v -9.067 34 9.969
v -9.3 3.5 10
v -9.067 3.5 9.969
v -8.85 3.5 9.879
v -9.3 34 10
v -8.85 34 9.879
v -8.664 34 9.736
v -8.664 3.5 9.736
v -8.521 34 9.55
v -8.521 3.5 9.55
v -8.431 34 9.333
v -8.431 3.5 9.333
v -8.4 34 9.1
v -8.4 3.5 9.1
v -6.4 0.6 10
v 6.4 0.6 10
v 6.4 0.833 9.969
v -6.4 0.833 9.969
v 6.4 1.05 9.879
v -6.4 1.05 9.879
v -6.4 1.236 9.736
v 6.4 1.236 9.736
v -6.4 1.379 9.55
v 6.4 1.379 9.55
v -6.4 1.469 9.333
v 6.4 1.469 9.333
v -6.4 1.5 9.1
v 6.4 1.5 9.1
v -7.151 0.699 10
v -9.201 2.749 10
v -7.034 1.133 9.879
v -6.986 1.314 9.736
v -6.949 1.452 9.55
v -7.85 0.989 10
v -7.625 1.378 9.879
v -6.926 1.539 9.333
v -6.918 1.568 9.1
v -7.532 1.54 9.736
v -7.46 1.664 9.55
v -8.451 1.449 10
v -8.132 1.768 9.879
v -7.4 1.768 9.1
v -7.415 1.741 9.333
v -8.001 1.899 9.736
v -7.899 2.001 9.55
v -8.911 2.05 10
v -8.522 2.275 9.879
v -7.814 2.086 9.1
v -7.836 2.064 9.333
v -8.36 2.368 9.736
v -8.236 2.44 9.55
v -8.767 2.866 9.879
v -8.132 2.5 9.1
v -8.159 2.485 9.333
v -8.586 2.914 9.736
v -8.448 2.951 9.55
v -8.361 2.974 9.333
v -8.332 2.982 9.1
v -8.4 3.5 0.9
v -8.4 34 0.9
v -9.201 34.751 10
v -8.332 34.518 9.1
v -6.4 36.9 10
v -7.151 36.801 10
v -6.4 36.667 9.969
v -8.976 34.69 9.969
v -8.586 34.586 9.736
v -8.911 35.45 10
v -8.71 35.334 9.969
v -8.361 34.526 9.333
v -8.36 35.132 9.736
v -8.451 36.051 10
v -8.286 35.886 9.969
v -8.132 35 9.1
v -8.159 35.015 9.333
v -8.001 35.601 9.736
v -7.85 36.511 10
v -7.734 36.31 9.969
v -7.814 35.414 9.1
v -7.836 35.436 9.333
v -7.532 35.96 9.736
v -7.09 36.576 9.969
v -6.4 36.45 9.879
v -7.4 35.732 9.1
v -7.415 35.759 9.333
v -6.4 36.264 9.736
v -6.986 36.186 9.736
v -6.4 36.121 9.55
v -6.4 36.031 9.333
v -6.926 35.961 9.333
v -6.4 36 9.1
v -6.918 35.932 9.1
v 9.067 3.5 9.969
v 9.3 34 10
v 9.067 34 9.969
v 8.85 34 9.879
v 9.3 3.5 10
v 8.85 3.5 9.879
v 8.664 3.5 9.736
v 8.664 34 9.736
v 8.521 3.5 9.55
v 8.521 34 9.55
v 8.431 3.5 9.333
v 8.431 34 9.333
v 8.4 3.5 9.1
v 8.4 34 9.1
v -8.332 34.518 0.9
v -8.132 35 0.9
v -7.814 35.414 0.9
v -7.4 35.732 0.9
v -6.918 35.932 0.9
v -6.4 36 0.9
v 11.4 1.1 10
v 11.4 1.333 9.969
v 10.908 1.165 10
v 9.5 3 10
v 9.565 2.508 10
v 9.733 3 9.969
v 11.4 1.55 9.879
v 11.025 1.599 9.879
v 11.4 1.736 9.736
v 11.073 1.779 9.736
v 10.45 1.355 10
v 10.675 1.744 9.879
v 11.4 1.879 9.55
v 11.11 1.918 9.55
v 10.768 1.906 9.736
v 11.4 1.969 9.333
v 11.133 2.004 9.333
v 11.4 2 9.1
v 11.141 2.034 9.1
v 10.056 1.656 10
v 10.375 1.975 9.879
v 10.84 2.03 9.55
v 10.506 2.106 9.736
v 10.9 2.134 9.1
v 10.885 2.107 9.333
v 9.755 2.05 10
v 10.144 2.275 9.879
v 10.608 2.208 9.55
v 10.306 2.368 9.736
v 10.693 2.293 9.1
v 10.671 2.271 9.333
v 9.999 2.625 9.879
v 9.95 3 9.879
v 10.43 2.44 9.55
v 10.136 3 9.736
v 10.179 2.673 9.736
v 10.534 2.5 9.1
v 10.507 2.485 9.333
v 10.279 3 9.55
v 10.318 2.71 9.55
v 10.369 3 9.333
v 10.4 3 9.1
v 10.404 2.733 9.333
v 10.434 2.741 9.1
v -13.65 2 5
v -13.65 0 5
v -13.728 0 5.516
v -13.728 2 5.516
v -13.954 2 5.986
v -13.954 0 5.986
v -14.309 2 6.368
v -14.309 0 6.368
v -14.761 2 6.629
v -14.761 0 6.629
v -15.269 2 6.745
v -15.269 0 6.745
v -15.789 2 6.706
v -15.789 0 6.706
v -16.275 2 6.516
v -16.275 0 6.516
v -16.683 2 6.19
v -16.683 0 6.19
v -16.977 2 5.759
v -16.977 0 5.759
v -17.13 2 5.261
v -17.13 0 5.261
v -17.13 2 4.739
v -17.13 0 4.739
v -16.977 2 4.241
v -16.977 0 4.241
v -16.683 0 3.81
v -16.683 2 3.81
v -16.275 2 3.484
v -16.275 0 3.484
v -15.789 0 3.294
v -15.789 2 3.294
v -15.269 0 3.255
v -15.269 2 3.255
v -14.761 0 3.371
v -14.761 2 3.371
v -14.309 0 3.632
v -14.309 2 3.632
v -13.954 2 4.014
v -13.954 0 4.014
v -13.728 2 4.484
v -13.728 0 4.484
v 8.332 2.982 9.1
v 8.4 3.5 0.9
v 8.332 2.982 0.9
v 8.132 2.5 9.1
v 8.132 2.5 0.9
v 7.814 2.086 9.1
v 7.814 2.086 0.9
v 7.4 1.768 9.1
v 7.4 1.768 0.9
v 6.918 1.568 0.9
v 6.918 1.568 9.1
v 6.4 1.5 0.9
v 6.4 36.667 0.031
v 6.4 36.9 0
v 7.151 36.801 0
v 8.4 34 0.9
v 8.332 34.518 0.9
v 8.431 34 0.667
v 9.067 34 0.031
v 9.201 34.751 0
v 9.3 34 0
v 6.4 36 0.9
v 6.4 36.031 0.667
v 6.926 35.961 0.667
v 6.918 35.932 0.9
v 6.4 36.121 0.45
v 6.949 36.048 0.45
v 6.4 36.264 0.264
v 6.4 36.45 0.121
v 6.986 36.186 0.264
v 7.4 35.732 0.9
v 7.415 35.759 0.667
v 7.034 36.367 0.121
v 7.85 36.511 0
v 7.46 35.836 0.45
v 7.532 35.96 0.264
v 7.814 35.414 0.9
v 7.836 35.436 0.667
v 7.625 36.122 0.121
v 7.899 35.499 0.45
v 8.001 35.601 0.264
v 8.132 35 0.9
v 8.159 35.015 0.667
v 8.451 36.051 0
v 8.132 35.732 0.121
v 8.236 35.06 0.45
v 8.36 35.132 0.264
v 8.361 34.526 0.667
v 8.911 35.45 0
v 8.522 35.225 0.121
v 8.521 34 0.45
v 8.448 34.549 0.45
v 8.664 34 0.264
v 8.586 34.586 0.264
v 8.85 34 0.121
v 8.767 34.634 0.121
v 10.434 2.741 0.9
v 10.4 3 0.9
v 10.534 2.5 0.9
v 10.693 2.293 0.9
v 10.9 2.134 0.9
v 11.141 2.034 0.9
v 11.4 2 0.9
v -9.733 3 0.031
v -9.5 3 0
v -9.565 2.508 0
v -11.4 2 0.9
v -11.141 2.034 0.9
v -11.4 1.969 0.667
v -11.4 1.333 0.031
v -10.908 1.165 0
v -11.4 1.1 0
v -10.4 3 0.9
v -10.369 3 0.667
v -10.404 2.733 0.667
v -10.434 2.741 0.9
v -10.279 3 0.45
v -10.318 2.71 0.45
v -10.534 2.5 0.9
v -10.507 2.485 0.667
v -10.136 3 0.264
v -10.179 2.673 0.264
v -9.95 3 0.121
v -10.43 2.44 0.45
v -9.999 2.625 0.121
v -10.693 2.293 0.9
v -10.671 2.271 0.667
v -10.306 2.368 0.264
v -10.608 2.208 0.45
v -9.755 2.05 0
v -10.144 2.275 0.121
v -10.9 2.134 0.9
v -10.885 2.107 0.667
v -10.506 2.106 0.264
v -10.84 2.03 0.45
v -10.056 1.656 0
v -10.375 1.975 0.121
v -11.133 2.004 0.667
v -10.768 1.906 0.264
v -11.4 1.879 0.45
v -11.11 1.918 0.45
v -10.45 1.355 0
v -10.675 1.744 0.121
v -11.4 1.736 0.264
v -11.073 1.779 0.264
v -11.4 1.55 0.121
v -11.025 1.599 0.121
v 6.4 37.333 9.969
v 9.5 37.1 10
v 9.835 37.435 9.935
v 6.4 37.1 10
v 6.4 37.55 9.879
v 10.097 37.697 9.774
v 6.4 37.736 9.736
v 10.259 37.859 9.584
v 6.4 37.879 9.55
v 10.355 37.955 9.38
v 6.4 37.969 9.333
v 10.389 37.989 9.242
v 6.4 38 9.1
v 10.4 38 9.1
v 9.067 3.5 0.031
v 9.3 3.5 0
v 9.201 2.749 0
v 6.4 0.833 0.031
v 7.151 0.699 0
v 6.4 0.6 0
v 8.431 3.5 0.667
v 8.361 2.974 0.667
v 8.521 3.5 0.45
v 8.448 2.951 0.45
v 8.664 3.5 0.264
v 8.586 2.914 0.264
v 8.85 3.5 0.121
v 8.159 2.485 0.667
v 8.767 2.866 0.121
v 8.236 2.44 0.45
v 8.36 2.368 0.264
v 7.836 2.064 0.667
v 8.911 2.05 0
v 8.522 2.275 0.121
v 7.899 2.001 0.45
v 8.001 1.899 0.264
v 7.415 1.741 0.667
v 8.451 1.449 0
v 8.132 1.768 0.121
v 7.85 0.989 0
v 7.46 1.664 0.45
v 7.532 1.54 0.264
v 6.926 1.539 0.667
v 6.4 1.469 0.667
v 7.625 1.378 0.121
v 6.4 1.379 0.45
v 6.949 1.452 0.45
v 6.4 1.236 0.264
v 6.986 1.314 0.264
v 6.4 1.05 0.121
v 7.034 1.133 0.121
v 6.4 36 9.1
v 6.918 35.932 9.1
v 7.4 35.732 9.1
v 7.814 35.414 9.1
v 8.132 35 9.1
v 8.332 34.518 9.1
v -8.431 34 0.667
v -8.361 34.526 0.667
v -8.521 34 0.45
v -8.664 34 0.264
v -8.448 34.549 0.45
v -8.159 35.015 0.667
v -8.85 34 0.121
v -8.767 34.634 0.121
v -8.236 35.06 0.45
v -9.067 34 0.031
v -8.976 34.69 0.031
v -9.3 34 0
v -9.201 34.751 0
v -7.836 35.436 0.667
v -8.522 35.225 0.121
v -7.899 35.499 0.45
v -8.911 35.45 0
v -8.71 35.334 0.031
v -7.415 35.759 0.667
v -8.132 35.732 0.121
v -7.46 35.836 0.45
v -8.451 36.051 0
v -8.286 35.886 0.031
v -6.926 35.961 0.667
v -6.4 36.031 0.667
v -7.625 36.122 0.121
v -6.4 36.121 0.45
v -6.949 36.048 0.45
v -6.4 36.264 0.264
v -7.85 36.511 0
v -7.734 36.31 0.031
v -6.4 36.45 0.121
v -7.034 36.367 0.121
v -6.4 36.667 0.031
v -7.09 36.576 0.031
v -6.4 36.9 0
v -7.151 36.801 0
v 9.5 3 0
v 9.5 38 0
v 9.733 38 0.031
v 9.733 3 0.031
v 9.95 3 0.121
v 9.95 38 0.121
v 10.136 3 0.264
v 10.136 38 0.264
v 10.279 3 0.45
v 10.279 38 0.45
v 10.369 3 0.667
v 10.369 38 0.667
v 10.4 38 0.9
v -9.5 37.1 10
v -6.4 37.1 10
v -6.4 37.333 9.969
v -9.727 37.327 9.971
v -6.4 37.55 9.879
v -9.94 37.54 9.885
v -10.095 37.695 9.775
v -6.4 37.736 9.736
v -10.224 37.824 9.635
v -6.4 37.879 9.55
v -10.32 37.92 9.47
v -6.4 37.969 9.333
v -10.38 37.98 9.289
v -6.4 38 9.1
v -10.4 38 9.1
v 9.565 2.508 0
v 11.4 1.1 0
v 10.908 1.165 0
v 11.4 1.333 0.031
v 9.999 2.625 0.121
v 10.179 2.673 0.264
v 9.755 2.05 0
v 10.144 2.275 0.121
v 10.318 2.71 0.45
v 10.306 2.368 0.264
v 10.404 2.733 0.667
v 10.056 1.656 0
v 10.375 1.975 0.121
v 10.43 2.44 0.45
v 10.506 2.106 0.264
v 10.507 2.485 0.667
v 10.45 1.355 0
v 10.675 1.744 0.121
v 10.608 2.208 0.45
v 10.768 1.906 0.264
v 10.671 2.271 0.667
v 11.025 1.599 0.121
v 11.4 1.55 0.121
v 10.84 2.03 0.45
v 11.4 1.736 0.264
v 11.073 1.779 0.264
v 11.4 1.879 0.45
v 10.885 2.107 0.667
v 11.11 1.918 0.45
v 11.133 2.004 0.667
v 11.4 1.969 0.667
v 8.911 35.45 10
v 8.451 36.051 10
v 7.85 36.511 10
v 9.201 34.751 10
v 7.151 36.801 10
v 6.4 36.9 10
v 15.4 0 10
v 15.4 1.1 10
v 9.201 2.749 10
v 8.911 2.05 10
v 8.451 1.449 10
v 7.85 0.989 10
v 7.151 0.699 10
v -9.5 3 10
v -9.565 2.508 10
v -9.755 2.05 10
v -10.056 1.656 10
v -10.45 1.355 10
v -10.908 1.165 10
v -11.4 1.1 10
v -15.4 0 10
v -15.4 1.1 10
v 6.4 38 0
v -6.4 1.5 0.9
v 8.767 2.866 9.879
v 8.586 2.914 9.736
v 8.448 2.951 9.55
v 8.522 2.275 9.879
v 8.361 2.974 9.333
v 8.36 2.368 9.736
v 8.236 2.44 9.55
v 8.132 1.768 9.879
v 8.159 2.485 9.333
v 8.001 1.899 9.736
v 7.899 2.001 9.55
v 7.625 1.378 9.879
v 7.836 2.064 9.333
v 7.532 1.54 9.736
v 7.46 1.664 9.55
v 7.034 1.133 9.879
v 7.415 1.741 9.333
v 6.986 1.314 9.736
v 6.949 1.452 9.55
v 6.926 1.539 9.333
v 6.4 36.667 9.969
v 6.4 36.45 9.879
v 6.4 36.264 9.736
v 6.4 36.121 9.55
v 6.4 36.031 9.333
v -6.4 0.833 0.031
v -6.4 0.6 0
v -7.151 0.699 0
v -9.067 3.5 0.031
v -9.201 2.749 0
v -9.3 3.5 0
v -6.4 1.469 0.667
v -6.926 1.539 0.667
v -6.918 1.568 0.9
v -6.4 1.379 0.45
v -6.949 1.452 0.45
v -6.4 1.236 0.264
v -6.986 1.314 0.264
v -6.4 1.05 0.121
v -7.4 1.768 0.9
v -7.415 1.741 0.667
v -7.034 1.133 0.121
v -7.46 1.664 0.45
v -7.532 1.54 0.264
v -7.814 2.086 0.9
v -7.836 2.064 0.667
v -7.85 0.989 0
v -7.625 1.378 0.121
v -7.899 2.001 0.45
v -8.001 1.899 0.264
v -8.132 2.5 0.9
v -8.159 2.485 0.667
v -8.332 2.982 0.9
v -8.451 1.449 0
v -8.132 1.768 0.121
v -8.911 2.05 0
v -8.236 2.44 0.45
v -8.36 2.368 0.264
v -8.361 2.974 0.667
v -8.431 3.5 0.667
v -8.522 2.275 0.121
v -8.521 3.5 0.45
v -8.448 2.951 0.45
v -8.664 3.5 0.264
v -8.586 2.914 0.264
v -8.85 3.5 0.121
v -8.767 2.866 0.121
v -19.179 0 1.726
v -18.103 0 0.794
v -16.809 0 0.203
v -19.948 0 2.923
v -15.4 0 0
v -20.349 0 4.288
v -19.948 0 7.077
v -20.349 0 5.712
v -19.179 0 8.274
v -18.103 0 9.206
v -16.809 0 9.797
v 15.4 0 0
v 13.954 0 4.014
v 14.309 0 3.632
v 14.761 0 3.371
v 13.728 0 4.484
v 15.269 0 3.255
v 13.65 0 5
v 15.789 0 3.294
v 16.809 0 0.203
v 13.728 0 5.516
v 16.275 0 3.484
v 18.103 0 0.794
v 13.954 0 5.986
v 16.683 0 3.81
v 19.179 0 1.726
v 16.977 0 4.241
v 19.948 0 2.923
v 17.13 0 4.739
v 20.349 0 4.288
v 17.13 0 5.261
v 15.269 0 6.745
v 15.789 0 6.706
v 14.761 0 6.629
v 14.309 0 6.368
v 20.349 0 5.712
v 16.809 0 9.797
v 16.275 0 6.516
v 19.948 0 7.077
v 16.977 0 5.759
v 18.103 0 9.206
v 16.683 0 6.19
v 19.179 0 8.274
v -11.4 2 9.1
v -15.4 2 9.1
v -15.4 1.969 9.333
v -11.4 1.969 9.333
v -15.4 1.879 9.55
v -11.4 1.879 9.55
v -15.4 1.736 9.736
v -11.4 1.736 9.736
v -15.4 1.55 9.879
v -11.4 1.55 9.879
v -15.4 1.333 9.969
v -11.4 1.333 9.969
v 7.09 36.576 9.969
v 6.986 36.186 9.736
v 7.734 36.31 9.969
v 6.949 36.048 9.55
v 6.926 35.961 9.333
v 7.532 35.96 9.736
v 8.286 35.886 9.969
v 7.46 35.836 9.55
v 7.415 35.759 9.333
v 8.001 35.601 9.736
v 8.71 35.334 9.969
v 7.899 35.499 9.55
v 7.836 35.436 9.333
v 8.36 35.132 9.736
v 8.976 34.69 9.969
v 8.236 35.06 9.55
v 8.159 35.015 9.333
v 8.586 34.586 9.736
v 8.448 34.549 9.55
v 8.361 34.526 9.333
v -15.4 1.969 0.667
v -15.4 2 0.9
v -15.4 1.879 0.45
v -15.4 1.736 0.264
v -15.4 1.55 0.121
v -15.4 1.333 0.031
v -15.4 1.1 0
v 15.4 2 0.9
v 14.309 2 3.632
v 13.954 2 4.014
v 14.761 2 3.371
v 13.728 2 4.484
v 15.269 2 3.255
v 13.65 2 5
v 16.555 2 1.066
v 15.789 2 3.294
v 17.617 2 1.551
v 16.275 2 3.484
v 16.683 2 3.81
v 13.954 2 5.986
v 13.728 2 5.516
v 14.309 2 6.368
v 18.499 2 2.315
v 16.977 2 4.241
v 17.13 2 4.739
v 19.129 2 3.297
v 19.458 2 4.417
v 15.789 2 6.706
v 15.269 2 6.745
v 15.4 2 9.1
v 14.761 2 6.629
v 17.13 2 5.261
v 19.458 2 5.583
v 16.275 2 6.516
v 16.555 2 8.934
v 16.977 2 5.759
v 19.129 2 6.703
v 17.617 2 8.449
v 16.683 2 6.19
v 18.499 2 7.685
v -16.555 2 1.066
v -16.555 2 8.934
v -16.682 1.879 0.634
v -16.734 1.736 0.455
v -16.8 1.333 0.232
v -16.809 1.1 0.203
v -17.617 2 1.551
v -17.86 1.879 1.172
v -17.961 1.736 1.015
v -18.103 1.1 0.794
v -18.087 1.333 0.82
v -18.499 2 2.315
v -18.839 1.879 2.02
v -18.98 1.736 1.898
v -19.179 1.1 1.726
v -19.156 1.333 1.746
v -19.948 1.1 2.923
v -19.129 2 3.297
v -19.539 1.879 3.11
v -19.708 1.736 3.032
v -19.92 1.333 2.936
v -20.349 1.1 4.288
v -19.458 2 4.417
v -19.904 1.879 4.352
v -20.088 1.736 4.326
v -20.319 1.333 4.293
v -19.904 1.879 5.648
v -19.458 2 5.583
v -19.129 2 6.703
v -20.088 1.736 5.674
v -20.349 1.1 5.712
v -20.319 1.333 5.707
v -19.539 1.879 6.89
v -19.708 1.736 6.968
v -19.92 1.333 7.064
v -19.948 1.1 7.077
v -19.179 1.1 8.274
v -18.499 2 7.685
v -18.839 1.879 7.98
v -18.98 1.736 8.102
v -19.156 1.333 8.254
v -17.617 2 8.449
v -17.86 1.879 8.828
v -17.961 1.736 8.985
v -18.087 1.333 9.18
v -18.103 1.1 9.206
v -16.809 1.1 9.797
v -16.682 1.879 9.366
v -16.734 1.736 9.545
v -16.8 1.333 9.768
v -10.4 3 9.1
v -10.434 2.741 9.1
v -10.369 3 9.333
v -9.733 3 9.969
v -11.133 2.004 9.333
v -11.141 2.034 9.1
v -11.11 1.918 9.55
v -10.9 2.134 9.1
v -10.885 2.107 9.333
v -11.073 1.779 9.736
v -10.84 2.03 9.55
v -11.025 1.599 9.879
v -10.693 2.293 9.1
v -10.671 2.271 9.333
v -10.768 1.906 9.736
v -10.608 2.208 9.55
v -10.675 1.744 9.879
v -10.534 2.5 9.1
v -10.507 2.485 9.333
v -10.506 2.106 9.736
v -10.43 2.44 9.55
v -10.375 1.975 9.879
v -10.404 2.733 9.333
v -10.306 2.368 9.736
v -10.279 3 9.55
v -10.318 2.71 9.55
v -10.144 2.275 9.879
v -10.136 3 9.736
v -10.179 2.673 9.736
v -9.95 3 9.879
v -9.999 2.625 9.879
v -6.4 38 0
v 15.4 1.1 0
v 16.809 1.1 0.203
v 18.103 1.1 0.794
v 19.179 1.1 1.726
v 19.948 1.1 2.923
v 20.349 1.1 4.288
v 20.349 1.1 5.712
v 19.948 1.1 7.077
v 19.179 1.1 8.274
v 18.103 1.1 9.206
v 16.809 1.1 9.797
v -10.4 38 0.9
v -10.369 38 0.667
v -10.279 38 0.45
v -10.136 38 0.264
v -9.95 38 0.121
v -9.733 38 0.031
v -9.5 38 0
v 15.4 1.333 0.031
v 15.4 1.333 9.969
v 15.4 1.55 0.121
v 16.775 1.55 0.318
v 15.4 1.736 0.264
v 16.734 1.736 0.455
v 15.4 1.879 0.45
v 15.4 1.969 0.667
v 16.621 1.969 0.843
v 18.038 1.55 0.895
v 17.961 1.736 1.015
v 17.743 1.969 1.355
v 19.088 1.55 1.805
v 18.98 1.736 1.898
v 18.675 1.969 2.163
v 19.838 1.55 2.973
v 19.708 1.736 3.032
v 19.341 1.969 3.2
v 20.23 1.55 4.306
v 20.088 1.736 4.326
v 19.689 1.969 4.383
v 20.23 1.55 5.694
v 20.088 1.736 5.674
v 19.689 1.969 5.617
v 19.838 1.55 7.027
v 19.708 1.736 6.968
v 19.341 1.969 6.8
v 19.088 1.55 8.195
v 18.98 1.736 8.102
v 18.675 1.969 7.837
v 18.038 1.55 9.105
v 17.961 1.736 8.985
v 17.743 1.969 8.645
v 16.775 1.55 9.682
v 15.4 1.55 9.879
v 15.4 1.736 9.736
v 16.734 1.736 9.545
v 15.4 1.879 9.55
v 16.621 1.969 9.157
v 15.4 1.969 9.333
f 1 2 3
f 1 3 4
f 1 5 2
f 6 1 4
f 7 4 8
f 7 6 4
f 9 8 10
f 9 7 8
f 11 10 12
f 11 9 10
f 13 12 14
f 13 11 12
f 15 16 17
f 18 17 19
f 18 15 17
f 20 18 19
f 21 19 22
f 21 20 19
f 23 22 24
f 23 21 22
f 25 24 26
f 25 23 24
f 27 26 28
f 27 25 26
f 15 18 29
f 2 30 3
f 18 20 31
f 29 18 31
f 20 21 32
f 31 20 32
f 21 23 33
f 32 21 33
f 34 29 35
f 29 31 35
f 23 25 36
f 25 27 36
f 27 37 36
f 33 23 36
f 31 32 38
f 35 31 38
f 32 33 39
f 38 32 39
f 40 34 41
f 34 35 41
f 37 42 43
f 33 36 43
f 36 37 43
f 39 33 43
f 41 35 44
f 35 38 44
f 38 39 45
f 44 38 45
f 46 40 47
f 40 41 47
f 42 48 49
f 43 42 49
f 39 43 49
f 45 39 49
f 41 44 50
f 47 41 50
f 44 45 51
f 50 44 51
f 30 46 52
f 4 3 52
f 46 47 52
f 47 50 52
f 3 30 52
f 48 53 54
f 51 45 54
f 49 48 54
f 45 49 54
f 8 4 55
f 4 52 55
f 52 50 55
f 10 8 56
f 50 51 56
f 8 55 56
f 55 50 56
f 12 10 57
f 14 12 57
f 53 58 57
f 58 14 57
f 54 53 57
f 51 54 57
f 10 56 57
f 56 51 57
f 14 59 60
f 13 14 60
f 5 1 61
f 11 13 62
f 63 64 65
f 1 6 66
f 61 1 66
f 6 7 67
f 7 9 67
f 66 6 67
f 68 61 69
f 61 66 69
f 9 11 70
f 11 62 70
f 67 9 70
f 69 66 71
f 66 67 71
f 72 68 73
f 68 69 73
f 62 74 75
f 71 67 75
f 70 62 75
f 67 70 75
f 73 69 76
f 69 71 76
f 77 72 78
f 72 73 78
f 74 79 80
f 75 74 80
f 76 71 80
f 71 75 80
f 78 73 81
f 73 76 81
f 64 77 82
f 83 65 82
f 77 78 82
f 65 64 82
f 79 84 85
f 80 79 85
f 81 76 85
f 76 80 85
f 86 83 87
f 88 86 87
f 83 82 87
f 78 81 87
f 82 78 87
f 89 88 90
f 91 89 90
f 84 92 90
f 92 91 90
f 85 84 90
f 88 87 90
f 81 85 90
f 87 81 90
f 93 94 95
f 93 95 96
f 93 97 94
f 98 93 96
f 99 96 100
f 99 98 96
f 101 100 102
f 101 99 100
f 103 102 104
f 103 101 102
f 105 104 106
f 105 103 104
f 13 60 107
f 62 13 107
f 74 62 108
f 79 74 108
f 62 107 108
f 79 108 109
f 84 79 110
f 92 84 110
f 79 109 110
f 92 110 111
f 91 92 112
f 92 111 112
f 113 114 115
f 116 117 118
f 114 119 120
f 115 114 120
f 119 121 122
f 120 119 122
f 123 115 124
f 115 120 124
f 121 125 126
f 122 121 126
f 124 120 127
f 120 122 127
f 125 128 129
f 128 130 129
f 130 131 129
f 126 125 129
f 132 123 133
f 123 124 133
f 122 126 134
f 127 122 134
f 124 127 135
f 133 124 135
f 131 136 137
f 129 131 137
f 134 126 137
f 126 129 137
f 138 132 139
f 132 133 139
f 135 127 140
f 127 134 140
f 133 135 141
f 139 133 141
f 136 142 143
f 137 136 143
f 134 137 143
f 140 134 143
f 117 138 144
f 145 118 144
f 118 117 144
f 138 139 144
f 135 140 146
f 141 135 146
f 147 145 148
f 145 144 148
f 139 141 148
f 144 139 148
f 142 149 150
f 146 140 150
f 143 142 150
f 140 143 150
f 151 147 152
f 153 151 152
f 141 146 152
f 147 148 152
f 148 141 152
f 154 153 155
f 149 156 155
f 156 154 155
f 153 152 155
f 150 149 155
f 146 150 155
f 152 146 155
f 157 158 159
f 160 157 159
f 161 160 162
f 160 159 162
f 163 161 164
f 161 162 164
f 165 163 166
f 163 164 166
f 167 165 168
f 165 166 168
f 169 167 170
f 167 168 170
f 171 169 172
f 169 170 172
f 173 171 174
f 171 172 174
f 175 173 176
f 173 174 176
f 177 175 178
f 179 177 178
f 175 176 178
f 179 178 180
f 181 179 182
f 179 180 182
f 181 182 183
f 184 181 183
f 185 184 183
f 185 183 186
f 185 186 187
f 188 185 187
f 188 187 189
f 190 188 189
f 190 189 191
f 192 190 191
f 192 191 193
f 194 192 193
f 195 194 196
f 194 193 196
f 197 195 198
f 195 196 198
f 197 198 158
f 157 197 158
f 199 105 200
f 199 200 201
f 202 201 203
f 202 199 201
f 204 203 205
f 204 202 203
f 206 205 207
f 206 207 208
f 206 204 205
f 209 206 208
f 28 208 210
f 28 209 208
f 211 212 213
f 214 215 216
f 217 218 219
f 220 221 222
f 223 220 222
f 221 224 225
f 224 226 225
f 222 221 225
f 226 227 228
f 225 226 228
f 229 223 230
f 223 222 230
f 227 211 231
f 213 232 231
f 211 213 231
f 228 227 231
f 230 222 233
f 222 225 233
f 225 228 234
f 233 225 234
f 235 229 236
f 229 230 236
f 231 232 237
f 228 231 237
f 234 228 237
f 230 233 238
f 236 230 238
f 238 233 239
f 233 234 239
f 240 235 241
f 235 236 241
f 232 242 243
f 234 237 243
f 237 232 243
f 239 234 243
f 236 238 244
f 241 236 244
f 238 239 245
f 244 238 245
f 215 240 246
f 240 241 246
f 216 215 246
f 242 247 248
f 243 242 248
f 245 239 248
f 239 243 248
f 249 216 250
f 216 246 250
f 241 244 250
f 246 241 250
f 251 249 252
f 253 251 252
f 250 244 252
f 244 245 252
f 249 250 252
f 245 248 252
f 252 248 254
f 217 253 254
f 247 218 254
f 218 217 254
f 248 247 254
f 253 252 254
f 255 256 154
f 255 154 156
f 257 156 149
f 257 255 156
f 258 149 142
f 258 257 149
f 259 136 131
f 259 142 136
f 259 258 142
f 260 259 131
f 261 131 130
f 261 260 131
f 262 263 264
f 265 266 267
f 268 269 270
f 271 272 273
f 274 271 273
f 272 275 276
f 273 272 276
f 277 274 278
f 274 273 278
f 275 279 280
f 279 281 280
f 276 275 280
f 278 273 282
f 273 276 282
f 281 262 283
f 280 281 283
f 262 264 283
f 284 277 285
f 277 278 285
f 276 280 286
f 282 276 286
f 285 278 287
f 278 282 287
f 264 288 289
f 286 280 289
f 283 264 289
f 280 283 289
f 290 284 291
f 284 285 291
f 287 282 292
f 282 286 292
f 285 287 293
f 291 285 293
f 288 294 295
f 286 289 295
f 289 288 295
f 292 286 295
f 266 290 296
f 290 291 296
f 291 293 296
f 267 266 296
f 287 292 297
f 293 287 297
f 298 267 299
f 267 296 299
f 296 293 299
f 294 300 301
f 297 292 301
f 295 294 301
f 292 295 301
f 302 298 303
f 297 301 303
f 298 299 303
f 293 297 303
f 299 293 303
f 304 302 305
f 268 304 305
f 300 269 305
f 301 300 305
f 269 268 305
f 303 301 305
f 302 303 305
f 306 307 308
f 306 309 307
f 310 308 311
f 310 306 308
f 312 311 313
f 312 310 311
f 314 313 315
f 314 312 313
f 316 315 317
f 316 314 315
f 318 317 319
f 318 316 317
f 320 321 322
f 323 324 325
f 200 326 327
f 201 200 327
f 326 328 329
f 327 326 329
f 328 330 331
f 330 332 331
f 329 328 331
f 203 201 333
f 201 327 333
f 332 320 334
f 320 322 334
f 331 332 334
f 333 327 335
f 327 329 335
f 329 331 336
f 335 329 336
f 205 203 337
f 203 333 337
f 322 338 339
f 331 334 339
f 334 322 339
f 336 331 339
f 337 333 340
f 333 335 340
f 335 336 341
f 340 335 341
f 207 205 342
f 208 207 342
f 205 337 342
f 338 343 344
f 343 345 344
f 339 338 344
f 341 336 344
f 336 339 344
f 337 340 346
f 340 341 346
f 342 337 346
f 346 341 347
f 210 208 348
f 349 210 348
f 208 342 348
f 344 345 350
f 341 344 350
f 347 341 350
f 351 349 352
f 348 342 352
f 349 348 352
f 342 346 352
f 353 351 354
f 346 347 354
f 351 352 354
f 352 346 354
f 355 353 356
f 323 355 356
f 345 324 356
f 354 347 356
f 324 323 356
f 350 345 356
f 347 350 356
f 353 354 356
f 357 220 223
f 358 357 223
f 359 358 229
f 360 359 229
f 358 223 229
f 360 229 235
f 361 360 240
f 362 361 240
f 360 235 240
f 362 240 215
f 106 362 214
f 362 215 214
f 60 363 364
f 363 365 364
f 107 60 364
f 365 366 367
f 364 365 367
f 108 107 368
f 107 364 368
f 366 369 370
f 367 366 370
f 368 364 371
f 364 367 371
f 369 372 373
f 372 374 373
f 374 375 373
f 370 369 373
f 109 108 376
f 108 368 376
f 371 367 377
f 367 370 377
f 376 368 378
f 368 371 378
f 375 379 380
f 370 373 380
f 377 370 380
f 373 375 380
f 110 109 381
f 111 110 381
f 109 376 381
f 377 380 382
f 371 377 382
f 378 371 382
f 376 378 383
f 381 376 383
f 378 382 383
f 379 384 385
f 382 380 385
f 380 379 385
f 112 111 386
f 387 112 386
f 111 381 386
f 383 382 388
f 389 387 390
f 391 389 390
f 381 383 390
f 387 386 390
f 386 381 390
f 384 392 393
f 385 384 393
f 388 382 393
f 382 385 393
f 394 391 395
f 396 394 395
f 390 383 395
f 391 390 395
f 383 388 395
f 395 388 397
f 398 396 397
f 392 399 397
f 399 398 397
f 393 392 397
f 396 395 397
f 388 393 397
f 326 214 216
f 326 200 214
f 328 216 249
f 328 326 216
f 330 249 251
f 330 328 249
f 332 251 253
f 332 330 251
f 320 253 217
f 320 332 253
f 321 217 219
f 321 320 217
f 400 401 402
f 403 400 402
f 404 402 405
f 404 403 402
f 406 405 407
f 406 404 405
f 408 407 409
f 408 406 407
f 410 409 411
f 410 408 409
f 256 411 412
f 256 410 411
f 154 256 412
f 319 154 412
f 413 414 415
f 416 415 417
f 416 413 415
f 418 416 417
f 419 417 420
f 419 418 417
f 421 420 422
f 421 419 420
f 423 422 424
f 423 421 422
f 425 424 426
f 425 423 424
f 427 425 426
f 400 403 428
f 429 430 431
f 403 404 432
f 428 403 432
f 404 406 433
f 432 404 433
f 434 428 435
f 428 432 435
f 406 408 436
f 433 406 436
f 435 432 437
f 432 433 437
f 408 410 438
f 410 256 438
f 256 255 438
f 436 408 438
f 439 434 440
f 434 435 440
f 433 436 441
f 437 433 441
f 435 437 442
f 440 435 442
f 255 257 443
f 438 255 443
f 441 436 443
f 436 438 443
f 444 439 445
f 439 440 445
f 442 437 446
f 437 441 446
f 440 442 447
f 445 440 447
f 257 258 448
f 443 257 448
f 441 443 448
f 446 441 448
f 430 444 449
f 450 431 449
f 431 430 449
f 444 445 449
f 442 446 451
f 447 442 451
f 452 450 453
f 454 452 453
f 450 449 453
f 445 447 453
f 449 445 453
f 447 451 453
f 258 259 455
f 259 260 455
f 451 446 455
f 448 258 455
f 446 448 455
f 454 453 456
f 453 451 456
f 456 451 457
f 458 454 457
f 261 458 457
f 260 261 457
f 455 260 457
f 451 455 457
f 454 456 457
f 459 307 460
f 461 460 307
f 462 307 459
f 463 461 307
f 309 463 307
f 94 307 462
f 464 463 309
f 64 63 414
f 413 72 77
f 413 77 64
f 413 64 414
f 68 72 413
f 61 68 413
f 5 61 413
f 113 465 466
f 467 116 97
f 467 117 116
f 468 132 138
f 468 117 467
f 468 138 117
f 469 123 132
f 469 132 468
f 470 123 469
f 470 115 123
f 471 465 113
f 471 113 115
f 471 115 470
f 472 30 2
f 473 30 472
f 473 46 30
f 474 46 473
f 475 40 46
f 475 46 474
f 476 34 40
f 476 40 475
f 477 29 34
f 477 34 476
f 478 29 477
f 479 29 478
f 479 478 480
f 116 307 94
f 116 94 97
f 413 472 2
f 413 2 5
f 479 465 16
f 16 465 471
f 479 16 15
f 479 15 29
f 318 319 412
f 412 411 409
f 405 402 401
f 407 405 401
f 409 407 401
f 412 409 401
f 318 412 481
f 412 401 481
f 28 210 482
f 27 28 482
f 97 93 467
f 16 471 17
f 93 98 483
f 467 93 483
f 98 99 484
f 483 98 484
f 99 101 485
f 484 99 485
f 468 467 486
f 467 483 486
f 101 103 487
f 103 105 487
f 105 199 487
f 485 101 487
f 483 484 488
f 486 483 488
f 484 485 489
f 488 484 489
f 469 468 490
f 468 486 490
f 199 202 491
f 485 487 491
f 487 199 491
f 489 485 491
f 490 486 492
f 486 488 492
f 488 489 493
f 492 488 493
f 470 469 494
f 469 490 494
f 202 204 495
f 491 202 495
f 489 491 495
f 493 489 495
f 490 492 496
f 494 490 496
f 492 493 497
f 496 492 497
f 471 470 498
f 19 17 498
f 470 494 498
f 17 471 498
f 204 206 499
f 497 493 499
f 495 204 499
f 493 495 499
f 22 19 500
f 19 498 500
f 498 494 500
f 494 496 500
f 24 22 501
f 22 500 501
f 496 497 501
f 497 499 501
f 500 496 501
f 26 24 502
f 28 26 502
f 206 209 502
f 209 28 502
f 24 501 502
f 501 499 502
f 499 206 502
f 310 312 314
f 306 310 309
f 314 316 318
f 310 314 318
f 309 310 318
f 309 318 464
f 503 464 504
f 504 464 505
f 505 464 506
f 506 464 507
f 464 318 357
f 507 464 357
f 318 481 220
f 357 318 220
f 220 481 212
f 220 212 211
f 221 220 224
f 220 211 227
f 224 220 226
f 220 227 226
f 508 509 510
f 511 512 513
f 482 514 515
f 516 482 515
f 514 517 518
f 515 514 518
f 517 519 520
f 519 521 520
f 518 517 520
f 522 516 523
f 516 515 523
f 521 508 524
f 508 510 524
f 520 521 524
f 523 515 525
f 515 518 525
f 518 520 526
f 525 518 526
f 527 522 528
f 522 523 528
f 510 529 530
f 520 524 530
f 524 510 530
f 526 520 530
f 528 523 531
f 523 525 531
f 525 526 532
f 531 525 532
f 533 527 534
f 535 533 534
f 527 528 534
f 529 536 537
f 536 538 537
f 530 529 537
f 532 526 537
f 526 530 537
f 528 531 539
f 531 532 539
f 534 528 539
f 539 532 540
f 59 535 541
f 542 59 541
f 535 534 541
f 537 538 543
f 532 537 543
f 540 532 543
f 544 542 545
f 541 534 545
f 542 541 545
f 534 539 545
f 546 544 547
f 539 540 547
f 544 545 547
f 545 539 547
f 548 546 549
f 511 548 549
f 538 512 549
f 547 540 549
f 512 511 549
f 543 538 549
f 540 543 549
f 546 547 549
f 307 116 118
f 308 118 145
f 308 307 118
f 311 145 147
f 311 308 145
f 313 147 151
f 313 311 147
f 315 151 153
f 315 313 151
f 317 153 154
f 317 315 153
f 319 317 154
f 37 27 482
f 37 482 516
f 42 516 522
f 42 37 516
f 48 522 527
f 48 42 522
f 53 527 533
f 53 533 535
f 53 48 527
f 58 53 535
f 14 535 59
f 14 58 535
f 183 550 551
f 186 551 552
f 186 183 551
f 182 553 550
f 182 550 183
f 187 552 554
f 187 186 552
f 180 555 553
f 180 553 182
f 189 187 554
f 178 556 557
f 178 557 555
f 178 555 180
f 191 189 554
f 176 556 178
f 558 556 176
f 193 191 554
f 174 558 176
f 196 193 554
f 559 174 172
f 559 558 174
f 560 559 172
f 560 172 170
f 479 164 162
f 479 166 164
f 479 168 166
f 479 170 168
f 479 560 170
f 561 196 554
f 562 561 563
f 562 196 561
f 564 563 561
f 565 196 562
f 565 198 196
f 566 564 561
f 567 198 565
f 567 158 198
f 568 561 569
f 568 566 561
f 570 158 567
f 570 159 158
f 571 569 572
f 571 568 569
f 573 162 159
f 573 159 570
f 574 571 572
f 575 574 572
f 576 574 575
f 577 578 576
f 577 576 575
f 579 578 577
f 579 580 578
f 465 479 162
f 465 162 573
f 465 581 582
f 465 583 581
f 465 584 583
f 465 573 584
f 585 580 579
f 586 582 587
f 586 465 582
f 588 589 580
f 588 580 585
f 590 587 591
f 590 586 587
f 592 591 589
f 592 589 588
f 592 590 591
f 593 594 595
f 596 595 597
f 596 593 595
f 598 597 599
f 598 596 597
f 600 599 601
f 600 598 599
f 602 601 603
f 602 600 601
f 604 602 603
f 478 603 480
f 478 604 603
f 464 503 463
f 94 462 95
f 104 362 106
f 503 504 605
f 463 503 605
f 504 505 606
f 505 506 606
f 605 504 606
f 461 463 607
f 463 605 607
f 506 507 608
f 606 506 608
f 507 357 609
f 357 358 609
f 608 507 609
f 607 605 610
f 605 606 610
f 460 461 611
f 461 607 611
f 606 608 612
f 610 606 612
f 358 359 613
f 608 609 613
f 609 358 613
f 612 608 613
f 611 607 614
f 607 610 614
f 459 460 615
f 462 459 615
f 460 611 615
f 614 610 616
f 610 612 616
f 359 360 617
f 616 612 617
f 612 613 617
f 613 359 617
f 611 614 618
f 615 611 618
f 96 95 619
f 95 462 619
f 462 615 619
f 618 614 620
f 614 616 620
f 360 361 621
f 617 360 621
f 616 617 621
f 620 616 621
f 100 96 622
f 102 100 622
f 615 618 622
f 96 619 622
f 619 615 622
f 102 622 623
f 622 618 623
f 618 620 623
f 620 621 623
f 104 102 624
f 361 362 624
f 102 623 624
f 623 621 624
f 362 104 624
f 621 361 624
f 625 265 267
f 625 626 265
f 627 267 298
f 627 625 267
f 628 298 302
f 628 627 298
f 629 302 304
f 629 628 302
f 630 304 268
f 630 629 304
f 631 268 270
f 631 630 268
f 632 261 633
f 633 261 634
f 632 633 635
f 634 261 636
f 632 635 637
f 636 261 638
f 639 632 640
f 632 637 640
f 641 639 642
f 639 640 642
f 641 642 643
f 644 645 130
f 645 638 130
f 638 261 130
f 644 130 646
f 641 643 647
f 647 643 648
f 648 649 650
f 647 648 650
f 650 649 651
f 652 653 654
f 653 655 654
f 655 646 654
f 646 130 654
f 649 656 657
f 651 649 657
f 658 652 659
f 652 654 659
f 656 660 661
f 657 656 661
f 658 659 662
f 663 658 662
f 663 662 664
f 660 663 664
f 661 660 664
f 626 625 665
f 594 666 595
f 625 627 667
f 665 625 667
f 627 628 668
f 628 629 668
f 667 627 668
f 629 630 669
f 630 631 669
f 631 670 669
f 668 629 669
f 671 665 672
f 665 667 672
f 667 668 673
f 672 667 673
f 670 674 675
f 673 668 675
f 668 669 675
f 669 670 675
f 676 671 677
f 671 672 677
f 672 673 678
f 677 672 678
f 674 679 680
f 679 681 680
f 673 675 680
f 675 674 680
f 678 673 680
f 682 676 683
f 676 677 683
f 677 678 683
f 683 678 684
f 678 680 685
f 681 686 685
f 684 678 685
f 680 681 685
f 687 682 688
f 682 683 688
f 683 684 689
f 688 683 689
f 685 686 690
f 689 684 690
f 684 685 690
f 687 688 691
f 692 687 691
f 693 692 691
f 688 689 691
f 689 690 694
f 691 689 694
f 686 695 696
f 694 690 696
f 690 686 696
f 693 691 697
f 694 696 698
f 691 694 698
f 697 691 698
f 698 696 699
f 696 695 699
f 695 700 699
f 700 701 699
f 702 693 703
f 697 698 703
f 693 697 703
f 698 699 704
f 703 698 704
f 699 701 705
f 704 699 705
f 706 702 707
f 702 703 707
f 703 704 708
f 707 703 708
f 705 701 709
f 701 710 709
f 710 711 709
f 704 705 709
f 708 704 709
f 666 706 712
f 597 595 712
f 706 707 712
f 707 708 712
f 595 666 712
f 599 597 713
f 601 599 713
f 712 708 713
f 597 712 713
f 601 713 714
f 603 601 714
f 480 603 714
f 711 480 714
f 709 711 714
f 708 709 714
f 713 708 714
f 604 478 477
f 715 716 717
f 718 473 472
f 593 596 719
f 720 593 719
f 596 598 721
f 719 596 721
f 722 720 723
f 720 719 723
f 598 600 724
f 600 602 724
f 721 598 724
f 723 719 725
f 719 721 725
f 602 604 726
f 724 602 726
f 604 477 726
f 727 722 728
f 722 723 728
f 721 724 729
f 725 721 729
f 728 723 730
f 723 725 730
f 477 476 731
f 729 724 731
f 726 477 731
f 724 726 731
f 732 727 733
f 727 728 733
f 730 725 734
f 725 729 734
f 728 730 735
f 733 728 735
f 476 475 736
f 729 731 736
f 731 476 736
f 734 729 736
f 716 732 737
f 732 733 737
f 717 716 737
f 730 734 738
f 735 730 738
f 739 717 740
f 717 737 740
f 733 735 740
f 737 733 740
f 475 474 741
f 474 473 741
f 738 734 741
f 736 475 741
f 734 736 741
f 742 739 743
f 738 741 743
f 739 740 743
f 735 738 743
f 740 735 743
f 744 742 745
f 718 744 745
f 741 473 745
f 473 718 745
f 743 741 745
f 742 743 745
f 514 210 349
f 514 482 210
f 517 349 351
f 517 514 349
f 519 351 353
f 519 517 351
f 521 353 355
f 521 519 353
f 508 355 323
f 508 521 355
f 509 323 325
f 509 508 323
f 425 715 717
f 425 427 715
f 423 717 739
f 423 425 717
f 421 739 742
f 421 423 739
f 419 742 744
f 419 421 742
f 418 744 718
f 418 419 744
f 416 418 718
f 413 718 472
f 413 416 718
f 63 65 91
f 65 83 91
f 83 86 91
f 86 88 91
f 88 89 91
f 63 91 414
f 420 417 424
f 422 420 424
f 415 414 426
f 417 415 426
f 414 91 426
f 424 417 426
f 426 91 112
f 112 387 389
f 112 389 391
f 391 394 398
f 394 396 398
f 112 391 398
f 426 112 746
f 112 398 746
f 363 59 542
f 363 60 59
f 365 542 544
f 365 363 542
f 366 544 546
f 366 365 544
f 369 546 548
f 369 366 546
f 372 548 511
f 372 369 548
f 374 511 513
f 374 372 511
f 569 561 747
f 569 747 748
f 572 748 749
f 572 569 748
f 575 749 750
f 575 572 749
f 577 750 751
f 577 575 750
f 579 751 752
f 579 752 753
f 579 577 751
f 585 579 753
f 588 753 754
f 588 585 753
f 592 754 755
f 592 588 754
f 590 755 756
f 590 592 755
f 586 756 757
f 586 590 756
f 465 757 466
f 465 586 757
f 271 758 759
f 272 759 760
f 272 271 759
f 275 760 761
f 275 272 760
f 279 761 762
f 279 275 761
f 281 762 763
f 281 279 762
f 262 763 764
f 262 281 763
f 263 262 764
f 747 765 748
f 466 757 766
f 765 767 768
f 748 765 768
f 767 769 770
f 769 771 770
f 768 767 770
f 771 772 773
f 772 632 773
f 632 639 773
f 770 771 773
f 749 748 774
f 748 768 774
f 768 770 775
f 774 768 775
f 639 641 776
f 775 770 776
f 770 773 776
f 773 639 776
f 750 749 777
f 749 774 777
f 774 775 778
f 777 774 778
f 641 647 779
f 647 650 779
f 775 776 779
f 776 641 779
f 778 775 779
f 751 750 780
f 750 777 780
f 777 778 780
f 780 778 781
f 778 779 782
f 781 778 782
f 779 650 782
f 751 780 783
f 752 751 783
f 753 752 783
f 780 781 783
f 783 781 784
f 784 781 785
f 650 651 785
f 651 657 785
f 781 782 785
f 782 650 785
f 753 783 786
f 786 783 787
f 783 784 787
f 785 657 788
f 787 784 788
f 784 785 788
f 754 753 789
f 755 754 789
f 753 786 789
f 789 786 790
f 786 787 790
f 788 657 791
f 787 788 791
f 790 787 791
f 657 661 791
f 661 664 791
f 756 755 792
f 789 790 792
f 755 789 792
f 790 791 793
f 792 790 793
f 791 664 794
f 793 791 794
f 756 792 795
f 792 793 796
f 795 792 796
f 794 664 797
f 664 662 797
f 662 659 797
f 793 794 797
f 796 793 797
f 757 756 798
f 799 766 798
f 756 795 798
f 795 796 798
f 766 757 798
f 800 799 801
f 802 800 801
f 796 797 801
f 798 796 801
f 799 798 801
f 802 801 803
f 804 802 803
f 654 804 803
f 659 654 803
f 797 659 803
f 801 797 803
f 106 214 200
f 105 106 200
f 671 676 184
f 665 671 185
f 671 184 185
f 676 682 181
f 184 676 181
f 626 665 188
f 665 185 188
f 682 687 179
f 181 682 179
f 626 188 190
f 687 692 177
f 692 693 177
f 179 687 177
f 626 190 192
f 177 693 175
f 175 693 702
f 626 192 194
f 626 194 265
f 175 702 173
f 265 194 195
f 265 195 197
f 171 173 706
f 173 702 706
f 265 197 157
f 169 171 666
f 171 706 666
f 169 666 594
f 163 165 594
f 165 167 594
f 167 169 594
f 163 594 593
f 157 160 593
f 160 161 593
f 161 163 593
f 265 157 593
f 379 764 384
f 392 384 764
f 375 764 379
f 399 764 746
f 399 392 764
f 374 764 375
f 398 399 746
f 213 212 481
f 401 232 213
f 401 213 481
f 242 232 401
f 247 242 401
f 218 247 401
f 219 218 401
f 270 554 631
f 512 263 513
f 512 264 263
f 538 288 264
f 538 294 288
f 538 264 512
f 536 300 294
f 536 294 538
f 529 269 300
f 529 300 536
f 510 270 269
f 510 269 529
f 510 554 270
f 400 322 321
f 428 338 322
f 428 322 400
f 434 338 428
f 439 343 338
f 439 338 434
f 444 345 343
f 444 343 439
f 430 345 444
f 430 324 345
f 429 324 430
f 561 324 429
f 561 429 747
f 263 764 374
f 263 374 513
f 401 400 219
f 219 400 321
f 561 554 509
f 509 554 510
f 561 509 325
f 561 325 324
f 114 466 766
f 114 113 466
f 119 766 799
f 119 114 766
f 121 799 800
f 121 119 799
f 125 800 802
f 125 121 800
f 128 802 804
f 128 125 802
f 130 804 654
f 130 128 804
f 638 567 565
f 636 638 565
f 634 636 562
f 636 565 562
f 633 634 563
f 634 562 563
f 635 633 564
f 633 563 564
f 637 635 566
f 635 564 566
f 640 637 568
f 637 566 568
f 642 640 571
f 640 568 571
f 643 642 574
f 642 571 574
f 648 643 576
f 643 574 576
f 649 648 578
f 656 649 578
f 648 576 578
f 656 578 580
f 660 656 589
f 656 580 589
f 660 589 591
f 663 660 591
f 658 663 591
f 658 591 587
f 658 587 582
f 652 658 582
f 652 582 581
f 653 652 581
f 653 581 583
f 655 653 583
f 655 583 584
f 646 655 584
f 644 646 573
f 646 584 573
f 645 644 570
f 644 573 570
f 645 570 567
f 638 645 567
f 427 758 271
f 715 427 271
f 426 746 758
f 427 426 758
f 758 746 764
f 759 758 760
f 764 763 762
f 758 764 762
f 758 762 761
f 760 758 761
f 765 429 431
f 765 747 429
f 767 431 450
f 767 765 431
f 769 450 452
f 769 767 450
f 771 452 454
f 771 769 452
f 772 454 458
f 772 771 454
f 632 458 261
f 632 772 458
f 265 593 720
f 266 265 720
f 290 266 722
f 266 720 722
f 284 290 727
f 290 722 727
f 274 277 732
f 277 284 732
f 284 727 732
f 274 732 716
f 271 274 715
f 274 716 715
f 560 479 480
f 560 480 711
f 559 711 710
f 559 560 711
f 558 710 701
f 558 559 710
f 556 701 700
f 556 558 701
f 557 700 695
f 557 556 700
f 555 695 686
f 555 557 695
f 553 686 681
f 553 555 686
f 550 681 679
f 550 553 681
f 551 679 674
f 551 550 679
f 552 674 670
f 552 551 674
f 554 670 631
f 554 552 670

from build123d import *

# Parameters (mm, degrees)
SALIENTE_EXTRUIR1_DEPTH = 10
REDONDEO1_R             = 2
CROQUIS4_R              = 1.75
SALIENTE_EXTRUIR2_DEPTH = 2
REDONDEO3_R             = 1
REDONDEO4_R             = 0.9


with BuildPart() as part:
    # Croquis2 → Saliente-Extruir1 (new body)
    with BuildSketch(Plane.XY):
        with BuildLine():
            Line((-10.4, 0), (10.4, 0))
            Line((10.4, 0), (10.4, 38))
            Line((10.4, 38), (6.4, 38))
            Line((6.4, 38), (6.4, 36))
            ThreePointArc((6.4, 36), (7.814213562, 35.414213562), (8.4, 34))
            Line((8.4, 34), (8.4, 1.5))
            Line((8.4, 1.5), (-8.4, 1.5))
            Line((-8.4, 1.5), (-8.4, 34))
            ThreePointArc((-8.4, 34), (-7.814213562, 35.414213562), (-6.4, 36))
            Line((-6.4, 36), (-6.4, 38))
            Line((-6.4, 38), (-10.4, 38))
            Line((-10.4, 38), (-10.4, 0))
        make_face()
    extrude(amount=SALIENTE_EXTRUIR1_DEPTH)

    # Redondeo1
    redondeo1_edges = [part.edges().sort_by_distance(p)[0] for p in [
        (-8.4, 1.5, 5),
        (8.4, 1.5, 5),
    ]]
    fillet(redondeo1_edges, radius=REDONDEO1_R)

    # Croquis4 → Saliente-Extruir2 (add)
    # profile 1 of 2: a face of its own
    with BuildSketch(Plane.XZ):
        with BuildLine():
            Line((-10.4, 10), (-15.4, 10))
            ThreePointArc((-15.4, 10), (-20.4, 5), (-15.4, 0))
            Line((-15.4, 0), (-10.4, 0))
            Line((-10.4, 0), (-10.4, 10))
        make_face()
        with Locations((-15.4, 5)):
            Circle(CROQUIS4_R, mode=Mode.SUBTRACT)
    # profile 2 of 2: a face of its own
    with BuildSketch(Plane.XZ):
        with BuildLine():
            Line((10.4, 0), (15.4, 0))
            ThreePointArc((15.4, 0), (20.4, 5), (15.4, 10))
            Line((15.4, 10), (10.4, 10))
            Line((10.4, 10), (10.4, 0))
        make_face()
        with Locations(Location((15.4, 5, 0), (0, 0, 180))):
            Circle(CROQUIS4_R, mode=Mode.SUBTRACT)
    extrude(amount=-SALIENTE_EXTRUIR2_DEPTH)

    # Redondeo3
    redondeo3_edges = [part.edges().sort_by_distance(p)[0] for p in [
        (-10.4, 2, 5),
        (10.4, 2, 5),
    ]]
    fillet(redondeo3_edges, radius=REDONDEO3_R)

    # Redondeo4
    redondeo4_edges = [part.edges().sort_by_distance(p)[0] for p in [
        (-10.4, 20.5, 0),
        (-7.814213562, 35.414213562, 0),
        (8.4, 18.75, 0),
        (7.814213562, 35.414213562, 0),
        (7.814213562, 35.414213562, 10),
        (8.4, 18.75, 10),
        (-7.814213562, 35.414213562, 10),
        (0, 1.5, 0),
        (0, 1.5, 10),
        (-8.4, 18.75, 0),
        (-8.4, 18.75, 10),
        (-8.4, 38, 10),
        (7.814213562, 2.085786438, 0),
        (7.814213562, 2.085786438, 10),
        (-7.814213562, 2.085786438, 0),
        (-7.814213562, 2.085786438, 10),
        (-10.4, 20.5, 10),
        (-13.4, 2, 0),
        (-20.4, 2, 5),
        (13.4, 2, 10),
        (20.4, 2, 5),
        (10.4, 20.5, 10),
        (10.4, 20.5, 0),
        (13.4, 2, 0),
        (-13.4, 2, 10),
        (10.692893219, 2.292893219, 0),
        (10.692893219, 2.292893219, 10),
        (-10.692893219, 2.292893219, 10),
        (-10.692893219, 2.292893219, 0),
        (8.4, 38, 10),
    ]]
    fillet(redondeo4_edges, radius=REDONDEO4_R)


solid = part.part
